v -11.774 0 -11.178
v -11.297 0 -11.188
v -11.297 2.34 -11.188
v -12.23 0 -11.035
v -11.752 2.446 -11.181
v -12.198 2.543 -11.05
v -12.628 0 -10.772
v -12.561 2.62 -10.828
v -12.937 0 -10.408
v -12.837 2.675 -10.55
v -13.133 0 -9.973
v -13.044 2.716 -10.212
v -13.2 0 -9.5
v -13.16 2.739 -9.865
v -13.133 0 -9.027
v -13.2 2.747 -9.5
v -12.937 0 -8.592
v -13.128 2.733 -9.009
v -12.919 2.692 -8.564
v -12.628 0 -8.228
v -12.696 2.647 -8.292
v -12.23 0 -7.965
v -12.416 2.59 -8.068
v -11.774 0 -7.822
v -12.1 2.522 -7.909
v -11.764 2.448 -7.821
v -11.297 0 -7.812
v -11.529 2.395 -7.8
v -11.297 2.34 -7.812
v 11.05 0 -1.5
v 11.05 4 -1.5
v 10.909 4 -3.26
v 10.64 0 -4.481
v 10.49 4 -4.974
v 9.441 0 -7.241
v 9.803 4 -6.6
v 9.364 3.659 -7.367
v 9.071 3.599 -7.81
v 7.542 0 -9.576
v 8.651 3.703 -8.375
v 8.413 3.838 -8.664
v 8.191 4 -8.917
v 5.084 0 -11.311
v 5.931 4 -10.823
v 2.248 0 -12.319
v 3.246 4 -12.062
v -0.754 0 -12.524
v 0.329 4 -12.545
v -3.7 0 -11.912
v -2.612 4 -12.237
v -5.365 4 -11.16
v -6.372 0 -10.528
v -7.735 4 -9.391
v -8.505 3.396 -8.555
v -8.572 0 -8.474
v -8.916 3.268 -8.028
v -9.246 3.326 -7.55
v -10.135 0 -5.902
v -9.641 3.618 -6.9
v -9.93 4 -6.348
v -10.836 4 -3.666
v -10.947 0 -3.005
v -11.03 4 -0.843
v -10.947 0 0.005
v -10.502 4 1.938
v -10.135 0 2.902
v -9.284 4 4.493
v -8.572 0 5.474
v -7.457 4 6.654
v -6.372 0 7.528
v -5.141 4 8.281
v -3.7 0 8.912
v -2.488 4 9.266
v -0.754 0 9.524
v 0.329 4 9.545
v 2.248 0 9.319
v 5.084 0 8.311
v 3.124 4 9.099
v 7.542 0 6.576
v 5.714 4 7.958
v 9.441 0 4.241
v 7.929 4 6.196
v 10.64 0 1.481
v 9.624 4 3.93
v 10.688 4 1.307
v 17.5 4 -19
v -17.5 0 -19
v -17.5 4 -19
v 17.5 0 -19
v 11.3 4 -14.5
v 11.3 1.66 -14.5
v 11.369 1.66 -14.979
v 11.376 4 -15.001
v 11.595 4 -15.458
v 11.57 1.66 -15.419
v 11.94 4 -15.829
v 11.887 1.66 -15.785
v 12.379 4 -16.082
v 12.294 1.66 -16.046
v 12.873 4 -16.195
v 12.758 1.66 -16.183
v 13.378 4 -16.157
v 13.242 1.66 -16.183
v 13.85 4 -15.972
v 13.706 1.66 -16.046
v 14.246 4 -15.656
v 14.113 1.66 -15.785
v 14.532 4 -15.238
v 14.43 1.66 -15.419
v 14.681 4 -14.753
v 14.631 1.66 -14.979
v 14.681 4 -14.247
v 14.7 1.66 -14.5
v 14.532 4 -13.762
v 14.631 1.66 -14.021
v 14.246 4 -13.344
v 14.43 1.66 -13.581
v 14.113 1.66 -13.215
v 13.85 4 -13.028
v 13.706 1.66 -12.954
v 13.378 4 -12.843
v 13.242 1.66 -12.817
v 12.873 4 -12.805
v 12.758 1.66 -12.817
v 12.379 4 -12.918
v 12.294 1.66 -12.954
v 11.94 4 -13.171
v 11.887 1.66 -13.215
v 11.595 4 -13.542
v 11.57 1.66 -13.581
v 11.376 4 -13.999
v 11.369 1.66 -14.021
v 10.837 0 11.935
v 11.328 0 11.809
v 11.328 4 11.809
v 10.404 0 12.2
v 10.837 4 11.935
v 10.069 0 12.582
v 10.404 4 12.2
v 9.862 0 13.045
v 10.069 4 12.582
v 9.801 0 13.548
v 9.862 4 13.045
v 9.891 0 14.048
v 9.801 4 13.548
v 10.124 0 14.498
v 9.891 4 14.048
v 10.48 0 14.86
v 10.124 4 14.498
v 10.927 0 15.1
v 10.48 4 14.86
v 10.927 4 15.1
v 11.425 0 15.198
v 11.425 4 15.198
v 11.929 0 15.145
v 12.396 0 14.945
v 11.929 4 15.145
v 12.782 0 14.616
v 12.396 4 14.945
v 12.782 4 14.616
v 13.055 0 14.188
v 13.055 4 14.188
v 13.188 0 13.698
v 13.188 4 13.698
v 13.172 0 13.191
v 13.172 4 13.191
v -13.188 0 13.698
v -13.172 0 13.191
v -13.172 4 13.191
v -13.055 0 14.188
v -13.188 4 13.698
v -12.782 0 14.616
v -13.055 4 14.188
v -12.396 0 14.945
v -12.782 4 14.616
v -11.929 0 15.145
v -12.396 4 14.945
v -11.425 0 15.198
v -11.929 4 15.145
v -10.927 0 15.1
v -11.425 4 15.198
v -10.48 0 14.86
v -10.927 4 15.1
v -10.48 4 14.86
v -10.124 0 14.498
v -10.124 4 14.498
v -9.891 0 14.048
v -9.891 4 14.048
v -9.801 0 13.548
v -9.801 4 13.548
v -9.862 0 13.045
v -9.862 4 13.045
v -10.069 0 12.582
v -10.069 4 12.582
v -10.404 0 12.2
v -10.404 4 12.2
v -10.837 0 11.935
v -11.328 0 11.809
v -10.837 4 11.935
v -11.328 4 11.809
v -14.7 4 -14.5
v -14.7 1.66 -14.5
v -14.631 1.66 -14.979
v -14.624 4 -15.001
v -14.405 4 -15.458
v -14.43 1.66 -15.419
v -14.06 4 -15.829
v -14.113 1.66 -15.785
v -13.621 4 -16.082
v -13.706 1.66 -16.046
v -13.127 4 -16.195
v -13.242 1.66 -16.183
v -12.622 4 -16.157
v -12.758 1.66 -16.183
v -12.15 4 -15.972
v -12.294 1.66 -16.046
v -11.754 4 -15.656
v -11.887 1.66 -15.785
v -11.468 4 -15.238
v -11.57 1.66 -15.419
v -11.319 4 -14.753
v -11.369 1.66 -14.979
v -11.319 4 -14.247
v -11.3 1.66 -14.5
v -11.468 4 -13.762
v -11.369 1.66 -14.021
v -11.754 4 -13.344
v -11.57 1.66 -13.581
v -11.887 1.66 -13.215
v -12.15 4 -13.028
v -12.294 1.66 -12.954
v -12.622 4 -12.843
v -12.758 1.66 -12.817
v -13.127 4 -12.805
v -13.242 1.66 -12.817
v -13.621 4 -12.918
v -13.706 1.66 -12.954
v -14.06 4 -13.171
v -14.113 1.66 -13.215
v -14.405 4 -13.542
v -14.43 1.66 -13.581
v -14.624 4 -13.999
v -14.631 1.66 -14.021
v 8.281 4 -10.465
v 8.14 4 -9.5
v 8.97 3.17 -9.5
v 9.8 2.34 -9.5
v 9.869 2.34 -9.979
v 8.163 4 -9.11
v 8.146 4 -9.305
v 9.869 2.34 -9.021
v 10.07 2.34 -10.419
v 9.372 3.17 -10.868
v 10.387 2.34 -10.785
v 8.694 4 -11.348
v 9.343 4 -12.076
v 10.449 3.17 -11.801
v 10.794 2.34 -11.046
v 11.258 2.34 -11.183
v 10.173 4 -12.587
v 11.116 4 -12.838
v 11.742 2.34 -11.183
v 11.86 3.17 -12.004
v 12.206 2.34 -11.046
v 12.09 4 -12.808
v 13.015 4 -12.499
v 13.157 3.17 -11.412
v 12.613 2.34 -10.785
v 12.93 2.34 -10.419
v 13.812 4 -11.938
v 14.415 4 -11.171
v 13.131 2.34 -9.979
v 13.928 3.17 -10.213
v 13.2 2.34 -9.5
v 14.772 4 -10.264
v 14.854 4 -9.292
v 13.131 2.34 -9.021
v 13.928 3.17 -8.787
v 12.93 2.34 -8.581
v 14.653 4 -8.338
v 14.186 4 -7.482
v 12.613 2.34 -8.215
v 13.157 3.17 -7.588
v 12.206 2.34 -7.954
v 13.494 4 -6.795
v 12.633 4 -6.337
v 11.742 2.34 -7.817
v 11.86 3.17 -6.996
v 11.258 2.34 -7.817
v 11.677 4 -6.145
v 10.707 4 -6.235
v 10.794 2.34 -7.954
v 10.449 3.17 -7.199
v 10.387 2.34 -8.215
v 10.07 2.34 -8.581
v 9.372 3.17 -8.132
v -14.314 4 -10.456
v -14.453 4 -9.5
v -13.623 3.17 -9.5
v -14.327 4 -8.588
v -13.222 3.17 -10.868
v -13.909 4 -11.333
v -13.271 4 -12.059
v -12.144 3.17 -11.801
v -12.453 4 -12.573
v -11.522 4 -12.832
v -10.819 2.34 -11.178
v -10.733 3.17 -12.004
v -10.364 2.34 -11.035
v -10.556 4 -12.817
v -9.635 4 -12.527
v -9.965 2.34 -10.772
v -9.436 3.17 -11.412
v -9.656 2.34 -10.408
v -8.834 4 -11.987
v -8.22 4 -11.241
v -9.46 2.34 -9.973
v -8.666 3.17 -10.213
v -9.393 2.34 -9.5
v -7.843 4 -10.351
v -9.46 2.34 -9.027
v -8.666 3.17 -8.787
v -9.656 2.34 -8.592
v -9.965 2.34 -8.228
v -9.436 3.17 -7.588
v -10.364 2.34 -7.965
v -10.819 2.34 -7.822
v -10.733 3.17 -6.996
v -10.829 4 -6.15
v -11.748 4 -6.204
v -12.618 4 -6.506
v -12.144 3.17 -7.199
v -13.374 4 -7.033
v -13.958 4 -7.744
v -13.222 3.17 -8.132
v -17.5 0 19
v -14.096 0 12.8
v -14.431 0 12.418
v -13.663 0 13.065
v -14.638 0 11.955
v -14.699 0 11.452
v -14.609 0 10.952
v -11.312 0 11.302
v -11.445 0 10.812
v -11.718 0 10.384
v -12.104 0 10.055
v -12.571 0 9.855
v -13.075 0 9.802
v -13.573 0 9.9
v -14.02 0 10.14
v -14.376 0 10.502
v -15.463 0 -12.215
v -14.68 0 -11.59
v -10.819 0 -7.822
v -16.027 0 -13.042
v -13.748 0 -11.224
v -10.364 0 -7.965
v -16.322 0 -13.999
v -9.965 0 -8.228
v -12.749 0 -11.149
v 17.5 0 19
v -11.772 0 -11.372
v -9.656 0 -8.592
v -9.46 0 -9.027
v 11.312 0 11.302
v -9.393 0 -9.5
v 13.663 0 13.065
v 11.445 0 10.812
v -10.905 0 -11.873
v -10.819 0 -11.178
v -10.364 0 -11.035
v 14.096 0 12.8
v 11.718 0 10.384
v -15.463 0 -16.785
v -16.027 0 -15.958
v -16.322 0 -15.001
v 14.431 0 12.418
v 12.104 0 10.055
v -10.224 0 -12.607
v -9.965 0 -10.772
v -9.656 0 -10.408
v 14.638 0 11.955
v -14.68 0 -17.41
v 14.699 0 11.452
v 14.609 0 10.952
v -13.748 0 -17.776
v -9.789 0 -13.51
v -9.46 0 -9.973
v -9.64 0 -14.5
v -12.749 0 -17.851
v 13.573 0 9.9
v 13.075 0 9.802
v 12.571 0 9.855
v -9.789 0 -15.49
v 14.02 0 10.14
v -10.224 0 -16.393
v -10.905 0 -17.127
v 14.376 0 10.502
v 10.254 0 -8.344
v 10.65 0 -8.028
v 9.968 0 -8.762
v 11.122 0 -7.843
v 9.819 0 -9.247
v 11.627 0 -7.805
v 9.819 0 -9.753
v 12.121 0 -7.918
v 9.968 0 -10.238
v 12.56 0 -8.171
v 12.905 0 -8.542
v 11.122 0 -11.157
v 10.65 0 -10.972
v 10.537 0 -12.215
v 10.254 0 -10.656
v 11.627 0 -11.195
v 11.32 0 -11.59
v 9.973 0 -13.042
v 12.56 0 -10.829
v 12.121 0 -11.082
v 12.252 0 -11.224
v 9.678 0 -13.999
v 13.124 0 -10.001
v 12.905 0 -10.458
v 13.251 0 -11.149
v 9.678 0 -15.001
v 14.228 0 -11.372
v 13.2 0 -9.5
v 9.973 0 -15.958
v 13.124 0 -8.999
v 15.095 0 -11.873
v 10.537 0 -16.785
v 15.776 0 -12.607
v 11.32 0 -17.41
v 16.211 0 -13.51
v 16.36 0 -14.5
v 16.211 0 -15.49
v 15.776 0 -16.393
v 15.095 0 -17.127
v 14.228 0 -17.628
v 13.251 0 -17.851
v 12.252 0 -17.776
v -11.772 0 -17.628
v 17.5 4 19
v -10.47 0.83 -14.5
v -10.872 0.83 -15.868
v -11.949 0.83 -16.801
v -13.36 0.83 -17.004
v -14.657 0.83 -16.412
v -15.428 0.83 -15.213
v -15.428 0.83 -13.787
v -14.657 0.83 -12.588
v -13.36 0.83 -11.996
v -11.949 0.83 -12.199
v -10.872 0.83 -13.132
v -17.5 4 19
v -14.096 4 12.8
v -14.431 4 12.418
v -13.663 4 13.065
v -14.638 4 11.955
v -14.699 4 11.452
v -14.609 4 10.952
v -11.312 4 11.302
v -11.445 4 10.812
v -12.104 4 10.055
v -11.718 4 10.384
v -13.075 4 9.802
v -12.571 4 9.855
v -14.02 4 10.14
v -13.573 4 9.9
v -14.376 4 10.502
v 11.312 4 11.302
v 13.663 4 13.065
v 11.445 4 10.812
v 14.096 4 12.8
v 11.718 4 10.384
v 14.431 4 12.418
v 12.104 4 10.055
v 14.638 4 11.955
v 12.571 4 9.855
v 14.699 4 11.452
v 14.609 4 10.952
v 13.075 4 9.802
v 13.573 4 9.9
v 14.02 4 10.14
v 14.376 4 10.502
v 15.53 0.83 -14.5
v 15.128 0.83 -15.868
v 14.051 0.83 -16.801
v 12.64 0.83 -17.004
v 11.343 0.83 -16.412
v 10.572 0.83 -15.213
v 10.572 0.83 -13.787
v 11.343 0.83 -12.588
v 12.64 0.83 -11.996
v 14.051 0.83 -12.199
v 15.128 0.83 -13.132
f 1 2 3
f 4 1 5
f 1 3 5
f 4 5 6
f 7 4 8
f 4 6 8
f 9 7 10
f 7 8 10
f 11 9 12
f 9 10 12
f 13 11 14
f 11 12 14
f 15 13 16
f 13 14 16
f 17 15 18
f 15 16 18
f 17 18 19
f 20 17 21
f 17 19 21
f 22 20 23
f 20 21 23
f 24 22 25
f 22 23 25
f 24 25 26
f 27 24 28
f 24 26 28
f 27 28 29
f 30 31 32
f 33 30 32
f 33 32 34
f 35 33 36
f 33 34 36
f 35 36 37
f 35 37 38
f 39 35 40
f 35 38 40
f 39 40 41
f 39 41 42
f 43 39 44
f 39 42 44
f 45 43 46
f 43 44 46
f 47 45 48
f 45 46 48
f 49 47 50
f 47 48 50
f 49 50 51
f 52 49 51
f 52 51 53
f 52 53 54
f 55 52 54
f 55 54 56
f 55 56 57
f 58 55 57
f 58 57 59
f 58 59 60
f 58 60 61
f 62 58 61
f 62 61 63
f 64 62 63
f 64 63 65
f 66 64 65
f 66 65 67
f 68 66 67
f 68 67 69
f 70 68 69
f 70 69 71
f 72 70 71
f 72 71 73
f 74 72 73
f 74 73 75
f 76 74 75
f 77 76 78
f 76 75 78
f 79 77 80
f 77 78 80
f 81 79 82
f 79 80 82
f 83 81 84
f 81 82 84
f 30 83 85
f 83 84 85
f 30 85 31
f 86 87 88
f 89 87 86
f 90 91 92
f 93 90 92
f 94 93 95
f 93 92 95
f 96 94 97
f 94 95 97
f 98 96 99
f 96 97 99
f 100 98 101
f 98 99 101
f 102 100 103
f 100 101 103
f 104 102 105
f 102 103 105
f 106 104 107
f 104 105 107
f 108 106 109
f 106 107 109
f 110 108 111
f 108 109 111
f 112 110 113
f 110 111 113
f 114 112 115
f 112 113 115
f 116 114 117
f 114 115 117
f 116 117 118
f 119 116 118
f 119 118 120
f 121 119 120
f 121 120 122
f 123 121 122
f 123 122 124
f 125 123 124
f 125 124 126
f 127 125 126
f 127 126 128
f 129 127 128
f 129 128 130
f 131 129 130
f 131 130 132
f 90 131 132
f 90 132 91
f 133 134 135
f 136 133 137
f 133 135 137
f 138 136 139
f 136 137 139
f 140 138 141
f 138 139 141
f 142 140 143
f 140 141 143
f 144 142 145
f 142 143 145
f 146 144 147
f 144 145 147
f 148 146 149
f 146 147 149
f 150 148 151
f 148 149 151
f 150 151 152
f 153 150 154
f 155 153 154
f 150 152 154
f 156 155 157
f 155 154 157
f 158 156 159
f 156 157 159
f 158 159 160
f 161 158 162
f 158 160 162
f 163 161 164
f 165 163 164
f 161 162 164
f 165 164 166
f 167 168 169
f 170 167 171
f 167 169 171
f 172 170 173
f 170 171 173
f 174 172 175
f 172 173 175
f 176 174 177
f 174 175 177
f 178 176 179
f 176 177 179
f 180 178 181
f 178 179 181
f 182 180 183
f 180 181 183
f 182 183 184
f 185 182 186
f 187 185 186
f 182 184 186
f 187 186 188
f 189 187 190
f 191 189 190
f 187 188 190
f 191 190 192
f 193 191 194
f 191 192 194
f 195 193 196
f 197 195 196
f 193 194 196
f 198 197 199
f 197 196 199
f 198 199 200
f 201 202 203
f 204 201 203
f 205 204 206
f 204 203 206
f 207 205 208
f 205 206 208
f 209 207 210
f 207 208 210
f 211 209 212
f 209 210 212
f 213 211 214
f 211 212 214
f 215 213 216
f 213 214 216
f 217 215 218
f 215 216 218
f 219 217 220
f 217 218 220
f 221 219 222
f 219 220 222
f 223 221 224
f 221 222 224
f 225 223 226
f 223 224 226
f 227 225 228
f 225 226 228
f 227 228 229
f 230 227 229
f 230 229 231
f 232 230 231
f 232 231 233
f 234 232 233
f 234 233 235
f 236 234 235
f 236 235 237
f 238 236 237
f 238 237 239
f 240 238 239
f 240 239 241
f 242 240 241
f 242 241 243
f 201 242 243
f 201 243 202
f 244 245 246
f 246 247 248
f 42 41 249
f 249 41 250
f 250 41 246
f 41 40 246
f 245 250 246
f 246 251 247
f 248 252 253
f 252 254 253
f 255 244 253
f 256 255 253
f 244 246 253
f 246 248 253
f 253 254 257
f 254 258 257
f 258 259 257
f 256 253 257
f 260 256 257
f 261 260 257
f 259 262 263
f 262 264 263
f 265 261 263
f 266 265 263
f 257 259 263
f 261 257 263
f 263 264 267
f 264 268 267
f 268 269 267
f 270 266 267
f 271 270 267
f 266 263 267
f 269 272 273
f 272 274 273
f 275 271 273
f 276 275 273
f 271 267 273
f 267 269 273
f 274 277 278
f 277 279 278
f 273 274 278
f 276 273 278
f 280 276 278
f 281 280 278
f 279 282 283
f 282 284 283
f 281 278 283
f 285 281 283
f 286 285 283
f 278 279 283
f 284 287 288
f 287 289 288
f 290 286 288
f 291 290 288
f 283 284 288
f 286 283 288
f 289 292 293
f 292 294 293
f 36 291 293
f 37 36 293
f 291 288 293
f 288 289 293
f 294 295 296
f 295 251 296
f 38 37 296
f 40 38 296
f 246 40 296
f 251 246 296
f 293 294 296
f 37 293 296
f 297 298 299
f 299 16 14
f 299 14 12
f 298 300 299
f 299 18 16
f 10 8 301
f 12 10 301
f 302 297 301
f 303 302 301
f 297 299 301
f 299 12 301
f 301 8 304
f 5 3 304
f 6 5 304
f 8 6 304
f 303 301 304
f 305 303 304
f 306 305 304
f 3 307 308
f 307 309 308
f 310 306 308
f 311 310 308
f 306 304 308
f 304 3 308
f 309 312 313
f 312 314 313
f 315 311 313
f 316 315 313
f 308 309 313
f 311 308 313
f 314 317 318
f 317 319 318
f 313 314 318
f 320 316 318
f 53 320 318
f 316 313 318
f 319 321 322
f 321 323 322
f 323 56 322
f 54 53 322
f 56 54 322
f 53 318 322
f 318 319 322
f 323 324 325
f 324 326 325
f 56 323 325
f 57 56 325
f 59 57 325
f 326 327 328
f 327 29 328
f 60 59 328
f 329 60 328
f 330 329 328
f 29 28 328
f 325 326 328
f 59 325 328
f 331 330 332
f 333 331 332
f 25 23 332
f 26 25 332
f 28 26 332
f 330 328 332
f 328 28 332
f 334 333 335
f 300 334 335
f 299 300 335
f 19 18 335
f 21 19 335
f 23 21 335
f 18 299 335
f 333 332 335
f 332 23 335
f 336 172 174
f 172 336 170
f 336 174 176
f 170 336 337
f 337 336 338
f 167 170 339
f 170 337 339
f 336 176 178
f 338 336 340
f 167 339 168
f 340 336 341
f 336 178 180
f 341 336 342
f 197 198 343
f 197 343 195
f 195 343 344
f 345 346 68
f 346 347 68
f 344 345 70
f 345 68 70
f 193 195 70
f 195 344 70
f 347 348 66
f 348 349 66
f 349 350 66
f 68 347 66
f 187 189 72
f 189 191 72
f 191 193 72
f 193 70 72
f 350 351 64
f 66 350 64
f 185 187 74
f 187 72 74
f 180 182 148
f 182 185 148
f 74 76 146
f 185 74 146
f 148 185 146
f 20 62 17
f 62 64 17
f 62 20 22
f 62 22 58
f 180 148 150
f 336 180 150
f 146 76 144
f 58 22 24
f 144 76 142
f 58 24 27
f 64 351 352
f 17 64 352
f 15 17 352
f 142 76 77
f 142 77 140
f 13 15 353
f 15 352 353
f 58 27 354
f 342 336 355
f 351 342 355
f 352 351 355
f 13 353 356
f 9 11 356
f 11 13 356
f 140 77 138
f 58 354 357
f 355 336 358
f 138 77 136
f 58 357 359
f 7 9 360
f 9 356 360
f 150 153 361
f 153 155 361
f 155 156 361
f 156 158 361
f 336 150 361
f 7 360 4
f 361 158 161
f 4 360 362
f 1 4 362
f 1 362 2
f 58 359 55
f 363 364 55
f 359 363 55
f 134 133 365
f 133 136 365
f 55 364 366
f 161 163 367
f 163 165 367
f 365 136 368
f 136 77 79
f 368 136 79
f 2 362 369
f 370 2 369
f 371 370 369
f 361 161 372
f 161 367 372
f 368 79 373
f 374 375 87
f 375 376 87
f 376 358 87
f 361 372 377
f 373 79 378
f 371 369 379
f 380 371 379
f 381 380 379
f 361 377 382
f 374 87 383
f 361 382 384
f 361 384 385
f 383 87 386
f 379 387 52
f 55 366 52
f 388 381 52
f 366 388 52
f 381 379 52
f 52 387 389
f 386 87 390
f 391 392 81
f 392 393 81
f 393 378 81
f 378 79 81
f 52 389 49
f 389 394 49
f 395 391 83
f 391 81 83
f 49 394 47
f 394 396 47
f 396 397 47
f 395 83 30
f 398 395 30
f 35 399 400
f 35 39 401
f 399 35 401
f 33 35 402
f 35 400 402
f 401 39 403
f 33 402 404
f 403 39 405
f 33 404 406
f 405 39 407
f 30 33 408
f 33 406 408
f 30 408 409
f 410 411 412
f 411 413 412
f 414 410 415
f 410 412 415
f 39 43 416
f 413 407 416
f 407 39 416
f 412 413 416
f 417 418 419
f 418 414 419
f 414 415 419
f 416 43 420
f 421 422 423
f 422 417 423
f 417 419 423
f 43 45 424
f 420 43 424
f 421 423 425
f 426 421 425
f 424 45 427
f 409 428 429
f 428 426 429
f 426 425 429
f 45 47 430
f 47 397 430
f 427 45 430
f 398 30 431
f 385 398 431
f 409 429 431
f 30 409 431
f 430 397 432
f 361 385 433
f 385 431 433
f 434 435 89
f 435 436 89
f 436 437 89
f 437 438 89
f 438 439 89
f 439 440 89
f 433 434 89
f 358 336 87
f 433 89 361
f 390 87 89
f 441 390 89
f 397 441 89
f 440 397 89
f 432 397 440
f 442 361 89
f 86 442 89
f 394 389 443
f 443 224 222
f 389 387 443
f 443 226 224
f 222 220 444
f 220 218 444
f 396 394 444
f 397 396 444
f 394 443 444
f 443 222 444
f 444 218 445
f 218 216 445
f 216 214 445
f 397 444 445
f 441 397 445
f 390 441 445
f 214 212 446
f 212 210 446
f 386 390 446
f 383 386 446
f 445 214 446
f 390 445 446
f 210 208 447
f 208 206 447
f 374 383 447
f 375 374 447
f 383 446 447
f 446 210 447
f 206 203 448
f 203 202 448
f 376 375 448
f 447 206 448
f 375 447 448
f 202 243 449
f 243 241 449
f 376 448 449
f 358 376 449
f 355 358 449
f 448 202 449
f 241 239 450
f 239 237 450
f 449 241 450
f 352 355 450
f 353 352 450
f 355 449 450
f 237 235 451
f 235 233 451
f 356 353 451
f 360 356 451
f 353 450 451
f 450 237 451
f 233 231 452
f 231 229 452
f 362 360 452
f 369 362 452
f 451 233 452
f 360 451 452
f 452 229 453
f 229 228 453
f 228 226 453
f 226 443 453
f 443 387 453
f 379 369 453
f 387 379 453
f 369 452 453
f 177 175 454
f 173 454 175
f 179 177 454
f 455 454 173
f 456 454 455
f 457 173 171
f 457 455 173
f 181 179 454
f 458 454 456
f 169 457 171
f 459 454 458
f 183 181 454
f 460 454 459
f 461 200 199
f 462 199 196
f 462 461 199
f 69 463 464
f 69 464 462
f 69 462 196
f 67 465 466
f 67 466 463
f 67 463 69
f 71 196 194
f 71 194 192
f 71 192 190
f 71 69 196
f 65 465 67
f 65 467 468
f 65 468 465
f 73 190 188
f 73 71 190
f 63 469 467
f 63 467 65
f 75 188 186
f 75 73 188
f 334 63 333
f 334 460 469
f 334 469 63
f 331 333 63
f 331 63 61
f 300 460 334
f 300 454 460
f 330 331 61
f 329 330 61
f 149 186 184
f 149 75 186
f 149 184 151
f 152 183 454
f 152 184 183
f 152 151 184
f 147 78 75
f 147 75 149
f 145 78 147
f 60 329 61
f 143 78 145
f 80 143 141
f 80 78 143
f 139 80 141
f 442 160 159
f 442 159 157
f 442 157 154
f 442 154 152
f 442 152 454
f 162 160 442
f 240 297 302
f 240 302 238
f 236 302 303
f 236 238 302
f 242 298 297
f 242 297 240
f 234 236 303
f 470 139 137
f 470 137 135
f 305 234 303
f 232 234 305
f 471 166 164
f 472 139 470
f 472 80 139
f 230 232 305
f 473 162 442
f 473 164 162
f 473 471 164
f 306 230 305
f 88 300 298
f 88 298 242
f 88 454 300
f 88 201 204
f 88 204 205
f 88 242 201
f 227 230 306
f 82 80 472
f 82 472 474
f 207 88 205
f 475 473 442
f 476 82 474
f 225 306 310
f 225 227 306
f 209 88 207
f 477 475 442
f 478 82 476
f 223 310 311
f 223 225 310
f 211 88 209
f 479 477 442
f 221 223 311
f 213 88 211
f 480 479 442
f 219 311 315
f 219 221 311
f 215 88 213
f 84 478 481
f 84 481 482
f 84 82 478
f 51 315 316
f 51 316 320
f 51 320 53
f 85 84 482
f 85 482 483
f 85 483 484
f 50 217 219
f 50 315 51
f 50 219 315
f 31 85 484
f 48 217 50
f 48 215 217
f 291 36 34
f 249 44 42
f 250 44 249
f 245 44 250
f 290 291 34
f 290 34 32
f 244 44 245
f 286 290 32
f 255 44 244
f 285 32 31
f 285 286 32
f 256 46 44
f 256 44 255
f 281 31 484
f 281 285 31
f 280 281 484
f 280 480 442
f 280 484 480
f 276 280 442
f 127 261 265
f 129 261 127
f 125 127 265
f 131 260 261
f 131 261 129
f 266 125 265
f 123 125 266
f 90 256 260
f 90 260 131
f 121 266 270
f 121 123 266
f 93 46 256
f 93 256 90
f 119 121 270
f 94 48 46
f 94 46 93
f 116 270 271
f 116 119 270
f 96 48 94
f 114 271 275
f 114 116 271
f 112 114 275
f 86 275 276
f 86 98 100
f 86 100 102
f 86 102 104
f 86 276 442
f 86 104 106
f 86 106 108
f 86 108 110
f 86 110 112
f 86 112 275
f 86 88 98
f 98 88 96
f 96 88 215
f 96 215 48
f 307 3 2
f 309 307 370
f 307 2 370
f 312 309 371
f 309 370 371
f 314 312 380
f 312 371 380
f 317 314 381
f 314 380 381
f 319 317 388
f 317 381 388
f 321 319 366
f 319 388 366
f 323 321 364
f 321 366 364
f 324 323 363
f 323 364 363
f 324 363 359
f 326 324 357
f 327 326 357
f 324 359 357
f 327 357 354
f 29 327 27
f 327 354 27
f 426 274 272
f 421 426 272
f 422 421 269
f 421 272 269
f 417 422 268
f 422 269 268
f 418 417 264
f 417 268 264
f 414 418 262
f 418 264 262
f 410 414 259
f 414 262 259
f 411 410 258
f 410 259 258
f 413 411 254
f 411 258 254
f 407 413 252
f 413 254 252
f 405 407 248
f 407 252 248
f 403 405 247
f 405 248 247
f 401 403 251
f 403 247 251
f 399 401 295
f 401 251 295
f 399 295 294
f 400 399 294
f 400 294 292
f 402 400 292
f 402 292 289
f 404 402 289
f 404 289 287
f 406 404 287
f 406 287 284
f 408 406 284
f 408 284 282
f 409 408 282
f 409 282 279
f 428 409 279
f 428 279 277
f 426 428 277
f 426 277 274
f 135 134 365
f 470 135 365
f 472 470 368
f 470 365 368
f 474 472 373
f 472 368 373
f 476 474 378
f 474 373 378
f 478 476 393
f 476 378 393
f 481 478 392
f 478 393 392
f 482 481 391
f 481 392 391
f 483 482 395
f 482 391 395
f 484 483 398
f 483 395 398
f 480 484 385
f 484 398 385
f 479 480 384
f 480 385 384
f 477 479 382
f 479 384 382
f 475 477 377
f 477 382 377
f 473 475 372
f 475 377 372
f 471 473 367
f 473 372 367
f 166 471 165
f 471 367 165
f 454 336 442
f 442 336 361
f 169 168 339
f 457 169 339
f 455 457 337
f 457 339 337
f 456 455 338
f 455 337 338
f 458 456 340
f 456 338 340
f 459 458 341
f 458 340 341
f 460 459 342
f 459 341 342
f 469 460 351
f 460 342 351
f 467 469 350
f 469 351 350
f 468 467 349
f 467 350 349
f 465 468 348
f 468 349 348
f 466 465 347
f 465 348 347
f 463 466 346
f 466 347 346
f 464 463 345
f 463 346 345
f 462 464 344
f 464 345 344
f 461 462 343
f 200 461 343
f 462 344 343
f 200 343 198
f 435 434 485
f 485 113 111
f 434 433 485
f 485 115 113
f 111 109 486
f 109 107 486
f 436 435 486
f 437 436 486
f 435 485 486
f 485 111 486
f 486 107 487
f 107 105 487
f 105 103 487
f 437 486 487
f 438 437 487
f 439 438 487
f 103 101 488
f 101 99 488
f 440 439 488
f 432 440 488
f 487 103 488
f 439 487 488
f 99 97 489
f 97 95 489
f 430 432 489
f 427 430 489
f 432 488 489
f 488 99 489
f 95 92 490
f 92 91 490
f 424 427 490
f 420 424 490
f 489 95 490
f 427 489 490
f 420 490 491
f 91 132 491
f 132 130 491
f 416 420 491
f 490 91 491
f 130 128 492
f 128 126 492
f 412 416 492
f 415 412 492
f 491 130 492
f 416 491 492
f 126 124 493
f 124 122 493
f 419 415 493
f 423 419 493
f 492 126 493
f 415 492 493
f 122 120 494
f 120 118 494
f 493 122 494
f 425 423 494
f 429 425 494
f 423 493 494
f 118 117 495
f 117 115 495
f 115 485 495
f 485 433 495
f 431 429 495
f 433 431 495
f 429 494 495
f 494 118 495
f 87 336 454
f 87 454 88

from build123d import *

# Parameters (mm, degrees)
SKETCH1_W                                            = 35
SKETCH1_H                                            = 38
BOSS_EXTRUDE1_DEPTH                                  = 4
M3_CLEARANCE_HOLE1_D                                 = 3.4
SKETCH4_R                                            = 11.05
CUT_EXTRUDE1_DEPTH                                   = 5
M3_CLEARANCE_HOLE2_D                                 = 3.4
CSK_FOR_M3_HEX_SOCKET_COUNTERSUNK_CAP_SC_D           = 3.4
CSK_FOR_M3_HEX_SOCKET_COUNTERSUNK_CAP_SC_CSINK_D     = 6.72
CSK_FOR_M3_HEX_SOCKET_COUNTERSUNK_CAP_SC_CSINK_ANGLE = 90
CSK_FOR_M3_HEX_SOCKET_COUNTERSUNK_CA_2_D             = 3.4
CSK_FOR_M3_HEX_SOCKET_COUNTERSUNK_CA_2_CSINK_D       = 6.72
CSK_FOR_M3_HEX_SOCKET_COUNTERSUNK_CA_2_CSINK_ANGLE   = 90


with BuildPart() as part:
    # Sketch1 → Boss-Extrude1 (new body)
    with BuildSketch(Plane(origin=(0, 0, 0), x_dir=(1, 0, 0), z_dir=(0, 1, 0))):
        Rectangle(SKETCH1_W, SKETCH1_H)
    extrude(amount=BOSS_EXTRUDE1_DEPTH)

    # M3 Clearance Hole1 (through all)
    with Locations(Plane(origin=(0, 0, 0), x_dir=(-1, 0, 0), z_dir=(0, -1, 0))):
        with Locations((-11.5, -13.5), (-11.5, 9.5), (11.5, 9.5), (11.5, -13.5)):
            Hole(M3_CLEARANCE_HOLE1_D / 2)

    # Sketch4 → Cut-Extrude1 (cut, through all)
    with BuildSketch(Plane(origin=(0, 4, 0), x_dir=(1, 0, 0), z_dir=(0, 1, 0))):
        with Locations((0, 1.5)):
            Circle(SKETCH4_R)
    extrude(amount=-CUT_EXTRUDE1_DEPTH, mode=Mode.SUBTRACT)

    # M3 Clearance Hole2 (through all)
    with Locations(Plane(origin=(0, 4, 0), x_dir=(1, 0, 0), z_dir=(0, 1, 0))):
        with Locations((-13, 14.5), (13, 14.5), (-13, -11.5), (13, -11.5)):
            Hole(M3_CLEARANCE_HOLE2_D / 2)

    # CSK for M3 Hex Socket Countersunk Cap Sc (through all)
    with Locations(Plane(origin=(0, 0, 0), x_dir=(-1, 0, 0), z_dir=(0, -1, 0))):
        with Locations((-13, 14.5), (13, 14.5)):
            CounterSinkHole(CSK_FOR_M3_HEX_SOCKET_COUNTERSUNK_CAP_SC_D / 2, CSK_FOR_M3_HEX_SOCKET_COUNTERSUNK_CAP_SC_CSINK_D / 2, counter_sink_angle=CSK_FOR_M3_HEX_SOCKET_COUNTERSUNK_CAP_SC_CSINK_ANGLE)

    # CSK for M3 Hex Socket Countersunk Ca 2 (through all)
    with Locations(Plane(origin=(0, 4, 0), x_dir=(1, 0, 0), z_dir=(0, 1, 0))):
        with Locations((11.5, 9.5), (-11.093205122, 9.5)):
            CounterSinkHole(CSK_FOR_M3_HEX_SOCKET_COUNTERSUNK_CA_2_D / 2, CSK_FOR_M3_HEX_SOCKET_COUNTERSUNK_CA_2_CSINK_D / 2, counter_sink_angle=CSK_FOR_M3_HEX_SOCKET_COUNTERSUNK_CA_2_CSINK_ANGLE)


solid = part.part
